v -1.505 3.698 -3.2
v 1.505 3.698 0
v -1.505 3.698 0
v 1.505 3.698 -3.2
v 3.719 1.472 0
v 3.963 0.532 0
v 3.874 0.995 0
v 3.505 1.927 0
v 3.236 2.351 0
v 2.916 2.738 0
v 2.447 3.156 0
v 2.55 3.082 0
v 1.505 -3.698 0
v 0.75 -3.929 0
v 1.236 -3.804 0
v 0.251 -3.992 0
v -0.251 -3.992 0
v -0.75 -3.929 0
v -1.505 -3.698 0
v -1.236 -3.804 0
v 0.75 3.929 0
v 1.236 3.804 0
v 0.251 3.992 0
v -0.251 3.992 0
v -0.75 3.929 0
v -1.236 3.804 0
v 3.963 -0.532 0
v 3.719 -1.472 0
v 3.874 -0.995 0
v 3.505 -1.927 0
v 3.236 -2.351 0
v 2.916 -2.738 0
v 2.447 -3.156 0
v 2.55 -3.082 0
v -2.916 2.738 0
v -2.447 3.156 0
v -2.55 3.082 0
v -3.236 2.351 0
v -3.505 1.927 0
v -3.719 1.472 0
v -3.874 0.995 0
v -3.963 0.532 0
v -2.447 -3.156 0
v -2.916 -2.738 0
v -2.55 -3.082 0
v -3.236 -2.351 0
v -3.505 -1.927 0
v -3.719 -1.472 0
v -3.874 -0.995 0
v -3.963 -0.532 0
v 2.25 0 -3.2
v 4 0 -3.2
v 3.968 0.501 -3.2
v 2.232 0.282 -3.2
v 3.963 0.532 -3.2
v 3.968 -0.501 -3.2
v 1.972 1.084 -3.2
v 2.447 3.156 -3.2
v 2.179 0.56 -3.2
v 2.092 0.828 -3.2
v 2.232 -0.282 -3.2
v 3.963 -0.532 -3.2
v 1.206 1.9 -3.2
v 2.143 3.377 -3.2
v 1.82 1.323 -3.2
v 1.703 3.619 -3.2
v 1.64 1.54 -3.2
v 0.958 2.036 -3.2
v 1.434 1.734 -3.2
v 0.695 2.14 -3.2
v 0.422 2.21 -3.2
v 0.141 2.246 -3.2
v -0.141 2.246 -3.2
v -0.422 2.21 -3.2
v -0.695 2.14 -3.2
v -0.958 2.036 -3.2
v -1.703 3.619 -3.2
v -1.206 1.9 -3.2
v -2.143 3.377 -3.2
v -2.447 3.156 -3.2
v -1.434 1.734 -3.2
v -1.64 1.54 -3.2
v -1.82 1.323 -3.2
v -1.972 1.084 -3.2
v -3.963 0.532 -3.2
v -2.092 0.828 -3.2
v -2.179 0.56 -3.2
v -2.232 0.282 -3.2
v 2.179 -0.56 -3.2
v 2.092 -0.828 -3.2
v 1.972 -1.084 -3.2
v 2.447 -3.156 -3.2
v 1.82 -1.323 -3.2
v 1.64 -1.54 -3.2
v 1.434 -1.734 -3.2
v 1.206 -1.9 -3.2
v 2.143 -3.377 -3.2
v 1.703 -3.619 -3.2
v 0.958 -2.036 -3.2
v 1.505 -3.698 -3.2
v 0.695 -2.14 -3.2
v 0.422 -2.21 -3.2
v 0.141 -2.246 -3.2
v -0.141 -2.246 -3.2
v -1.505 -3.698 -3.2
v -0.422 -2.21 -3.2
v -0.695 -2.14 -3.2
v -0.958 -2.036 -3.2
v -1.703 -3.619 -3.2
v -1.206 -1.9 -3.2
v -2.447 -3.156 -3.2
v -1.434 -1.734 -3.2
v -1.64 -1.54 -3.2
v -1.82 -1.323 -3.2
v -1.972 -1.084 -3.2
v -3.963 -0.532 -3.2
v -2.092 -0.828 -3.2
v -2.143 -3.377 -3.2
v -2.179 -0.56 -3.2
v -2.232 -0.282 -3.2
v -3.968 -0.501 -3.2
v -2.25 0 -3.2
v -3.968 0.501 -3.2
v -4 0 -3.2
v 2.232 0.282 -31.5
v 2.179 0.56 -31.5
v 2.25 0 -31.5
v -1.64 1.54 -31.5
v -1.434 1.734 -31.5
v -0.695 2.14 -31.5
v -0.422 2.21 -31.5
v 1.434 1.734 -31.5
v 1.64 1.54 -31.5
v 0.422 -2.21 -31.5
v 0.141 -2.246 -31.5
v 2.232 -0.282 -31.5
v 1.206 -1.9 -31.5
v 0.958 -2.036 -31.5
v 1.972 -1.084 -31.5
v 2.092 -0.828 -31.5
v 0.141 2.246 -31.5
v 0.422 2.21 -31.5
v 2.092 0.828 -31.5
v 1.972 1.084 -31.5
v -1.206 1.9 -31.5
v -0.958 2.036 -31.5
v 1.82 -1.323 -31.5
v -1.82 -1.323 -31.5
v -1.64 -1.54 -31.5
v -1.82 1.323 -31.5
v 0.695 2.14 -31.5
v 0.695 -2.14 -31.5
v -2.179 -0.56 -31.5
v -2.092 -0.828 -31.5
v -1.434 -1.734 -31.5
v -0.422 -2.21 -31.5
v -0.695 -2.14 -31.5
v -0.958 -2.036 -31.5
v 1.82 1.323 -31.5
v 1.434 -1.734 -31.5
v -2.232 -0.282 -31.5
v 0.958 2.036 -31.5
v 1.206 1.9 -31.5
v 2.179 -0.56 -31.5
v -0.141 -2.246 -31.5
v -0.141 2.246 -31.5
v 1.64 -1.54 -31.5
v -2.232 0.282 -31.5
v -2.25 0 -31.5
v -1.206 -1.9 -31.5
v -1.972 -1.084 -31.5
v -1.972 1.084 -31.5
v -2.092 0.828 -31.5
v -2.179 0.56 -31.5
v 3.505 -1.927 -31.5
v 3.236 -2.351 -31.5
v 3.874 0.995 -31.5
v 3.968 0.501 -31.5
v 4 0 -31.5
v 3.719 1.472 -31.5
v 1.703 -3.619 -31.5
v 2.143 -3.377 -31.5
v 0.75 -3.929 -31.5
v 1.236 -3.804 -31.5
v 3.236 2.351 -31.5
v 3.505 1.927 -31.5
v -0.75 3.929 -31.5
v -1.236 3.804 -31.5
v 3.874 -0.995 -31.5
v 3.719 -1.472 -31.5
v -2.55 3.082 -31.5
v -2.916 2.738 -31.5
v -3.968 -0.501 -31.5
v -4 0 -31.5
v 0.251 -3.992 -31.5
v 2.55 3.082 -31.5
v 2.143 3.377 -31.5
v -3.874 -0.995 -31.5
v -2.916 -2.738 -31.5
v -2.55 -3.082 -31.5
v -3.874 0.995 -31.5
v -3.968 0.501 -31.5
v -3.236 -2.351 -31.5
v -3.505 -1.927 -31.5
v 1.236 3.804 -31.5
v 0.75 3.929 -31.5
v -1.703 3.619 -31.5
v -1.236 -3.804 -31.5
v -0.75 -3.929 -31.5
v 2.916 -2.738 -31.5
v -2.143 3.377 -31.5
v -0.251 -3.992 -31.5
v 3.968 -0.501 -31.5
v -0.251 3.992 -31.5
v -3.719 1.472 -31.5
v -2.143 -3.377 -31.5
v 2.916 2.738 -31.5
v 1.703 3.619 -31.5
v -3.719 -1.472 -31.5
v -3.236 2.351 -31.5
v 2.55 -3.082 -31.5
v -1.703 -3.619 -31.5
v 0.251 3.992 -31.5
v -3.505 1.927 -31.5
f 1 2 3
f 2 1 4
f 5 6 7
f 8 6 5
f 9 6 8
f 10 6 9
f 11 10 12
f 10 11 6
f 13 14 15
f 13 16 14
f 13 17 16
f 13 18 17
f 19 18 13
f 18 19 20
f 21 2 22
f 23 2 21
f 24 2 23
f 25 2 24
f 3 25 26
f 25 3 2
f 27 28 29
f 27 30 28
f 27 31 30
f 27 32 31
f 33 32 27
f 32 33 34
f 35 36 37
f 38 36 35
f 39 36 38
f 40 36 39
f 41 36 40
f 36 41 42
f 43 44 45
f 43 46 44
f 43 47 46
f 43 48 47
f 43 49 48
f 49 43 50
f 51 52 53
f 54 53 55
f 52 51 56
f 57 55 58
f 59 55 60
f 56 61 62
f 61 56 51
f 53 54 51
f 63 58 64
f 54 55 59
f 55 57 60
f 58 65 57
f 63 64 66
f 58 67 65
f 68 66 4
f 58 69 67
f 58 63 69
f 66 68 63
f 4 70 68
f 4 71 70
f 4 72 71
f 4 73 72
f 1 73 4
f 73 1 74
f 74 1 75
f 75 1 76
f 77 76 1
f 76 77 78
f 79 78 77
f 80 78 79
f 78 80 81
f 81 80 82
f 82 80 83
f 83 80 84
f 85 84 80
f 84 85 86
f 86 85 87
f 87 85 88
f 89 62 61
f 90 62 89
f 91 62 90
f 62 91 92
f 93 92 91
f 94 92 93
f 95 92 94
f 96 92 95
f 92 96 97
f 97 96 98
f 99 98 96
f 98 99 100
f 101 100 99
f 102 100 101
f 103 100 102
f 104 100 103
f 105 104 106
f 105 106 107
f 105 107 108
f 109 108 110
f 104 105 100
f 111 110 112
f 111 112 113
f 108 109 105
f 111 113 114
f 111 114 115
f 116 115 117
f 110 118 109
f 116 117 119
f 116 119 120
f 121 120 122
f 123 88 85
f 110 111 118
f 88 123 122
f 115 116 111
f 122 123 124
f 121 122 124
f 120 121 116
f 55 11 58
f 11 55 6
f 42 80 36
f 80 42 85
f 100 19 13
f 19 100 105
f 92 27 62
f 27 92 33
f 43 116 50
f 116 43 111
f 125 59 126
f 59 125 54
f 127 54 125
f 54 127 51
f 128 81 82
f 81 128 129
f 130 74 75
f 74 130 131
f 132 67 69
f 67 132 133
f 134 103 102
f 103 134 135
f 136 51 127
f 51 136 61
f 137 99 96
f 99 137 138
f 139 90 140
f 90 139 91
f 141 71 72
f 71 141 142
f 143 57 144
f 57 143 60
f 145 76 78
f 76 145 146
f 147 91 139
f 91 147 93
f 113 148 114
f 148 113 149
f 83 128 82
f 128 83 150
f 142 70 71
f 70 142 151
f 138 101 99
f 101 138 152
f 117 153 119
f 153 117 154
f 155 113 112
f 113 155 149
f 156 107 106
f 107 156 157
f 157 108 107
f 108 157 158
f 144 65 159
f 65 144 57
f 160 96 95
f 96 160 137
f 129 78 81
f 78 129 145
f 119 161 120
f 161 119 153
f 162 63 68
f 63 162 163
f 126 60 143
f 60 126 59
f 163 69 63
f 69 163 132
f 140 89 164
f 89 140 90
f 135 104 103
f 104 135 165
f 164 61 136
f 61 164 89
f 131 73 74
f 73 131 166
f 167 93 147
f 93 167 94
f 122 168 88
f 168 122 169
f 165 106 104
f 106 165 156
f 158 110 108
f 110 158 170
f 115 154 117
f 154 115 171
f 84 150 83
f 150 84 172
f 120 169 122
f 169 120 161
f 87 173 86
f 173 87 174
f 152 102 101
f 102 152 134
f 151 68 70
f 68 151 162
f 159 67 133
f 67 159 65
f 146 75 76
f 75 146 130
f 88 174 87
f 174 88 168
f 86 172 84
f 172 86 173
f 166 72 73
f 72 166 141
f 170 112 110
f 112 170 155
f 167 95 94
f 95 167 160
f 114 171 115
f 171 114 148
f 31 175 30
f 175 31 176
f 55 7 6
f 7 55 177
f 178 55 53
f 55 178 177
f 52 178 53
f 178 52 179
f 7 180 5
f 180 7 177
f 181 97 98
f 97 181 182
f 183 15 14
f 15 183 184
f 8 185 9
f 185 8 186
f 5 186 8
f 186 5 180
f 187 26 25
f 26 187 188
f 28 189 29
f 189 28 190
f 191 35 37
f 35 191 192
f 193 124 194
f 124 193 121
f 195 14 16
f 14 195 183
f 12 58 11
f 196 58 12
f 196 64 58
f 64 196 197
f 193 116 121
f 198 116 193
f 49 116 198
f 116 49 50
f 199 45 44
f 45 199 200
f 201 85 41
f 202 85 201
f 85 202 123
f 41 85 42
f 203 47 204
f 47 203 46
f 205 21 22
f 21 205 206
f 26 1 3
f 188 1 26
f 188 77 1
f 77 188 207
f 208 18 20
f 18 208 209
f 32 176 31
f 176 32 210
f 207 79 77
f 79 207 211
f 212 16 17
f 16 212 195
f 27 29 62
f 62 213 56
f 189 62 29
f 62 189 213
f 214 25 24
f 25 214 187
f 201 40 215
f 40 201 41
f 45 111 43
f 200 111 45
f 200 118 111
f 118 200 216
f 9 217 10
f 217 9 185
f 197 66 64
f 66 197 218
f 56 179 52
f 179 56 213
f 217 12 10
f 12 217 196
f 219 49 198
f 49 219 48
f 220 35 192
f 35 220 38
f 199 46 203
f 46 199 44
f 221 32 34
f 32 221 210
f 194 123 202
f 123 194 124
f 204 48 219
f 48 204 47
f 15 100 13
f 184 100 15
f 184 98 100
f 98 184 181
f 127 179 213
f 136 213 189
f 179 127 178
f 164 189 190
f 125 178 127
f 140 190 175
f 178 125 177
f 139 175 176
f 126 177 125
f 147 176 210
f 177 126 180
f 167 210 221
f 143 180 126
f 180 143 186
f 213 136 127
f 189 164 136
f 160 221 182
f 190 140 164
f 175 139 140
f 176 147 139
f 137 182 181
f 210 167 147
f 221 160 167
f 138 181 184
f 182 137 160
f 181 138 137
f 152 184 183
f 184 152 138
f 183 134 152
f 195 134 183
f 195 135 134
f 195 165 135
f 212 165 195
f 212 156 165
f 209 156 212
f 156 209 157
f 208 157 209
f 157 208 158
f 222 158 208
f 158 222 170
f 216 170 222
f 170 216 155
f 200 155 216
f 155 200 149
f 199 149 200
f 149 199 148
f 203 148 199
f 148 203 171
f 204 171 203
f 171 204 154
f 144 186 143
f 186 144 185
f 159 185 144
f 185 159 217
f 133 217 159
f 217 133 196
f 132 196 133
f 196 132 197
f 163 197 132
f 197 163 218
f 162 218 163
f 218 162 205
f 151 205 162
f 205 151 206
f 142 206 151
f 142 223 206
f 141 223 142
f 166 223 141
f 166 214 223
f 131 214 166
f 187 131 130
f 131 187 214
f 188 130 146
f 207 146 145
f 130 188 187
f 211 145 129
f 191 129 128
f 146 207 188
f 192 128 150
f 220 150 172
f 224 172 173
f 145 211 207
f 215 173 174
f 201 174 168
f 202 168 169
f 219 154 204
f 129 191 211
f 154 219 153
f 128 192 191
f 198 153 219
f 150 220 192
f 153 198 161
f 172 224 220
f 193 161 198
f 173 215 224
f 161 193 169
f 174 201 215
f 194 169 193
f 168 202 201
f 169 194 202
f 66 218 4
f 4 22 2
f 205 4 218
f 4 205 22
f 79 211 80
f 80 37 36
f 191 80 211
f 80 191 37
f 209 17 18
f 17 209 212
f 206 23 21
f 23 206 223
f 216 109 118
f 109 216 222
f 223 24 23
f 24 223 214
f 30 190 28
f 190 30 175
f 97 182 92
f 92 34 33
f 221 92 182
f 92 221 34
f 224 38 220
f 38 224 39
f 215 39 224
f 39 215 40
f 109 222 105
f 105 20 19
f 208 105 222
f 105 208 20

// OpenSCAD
$fn = 50;

difference() {
	union() {
		translate(v = [0, 0, -31.5]) {
			cylinder(h = 31.5, r = 4.0);
		}
	}
	union() {
		translate(v = [0, 0, 0]) {
			rotate(a = [0, 0, 0]) {
				difference() {
					union() {
						translate(v = [0, 0, -3.2]) {
							linear_extrude(height = 3.2) {
								polygon(points = [[4.2698, 0.0], [2.1349000000000005, 3.697755269078796], [-2.134899999999999, 3.6977552690787965], [-4.2698, 5.228996902999369e-16], [-2.134900000000002, -3.6977552690787956], [2.1348999999999974, -3.697755269078798]]);
							}
						}
					}
					union();
				}
			}
		}
		#translate(v = [0, 0, -100.0]) {
			cylinder(h = 200, r = 2.25);
		}
	}
}
